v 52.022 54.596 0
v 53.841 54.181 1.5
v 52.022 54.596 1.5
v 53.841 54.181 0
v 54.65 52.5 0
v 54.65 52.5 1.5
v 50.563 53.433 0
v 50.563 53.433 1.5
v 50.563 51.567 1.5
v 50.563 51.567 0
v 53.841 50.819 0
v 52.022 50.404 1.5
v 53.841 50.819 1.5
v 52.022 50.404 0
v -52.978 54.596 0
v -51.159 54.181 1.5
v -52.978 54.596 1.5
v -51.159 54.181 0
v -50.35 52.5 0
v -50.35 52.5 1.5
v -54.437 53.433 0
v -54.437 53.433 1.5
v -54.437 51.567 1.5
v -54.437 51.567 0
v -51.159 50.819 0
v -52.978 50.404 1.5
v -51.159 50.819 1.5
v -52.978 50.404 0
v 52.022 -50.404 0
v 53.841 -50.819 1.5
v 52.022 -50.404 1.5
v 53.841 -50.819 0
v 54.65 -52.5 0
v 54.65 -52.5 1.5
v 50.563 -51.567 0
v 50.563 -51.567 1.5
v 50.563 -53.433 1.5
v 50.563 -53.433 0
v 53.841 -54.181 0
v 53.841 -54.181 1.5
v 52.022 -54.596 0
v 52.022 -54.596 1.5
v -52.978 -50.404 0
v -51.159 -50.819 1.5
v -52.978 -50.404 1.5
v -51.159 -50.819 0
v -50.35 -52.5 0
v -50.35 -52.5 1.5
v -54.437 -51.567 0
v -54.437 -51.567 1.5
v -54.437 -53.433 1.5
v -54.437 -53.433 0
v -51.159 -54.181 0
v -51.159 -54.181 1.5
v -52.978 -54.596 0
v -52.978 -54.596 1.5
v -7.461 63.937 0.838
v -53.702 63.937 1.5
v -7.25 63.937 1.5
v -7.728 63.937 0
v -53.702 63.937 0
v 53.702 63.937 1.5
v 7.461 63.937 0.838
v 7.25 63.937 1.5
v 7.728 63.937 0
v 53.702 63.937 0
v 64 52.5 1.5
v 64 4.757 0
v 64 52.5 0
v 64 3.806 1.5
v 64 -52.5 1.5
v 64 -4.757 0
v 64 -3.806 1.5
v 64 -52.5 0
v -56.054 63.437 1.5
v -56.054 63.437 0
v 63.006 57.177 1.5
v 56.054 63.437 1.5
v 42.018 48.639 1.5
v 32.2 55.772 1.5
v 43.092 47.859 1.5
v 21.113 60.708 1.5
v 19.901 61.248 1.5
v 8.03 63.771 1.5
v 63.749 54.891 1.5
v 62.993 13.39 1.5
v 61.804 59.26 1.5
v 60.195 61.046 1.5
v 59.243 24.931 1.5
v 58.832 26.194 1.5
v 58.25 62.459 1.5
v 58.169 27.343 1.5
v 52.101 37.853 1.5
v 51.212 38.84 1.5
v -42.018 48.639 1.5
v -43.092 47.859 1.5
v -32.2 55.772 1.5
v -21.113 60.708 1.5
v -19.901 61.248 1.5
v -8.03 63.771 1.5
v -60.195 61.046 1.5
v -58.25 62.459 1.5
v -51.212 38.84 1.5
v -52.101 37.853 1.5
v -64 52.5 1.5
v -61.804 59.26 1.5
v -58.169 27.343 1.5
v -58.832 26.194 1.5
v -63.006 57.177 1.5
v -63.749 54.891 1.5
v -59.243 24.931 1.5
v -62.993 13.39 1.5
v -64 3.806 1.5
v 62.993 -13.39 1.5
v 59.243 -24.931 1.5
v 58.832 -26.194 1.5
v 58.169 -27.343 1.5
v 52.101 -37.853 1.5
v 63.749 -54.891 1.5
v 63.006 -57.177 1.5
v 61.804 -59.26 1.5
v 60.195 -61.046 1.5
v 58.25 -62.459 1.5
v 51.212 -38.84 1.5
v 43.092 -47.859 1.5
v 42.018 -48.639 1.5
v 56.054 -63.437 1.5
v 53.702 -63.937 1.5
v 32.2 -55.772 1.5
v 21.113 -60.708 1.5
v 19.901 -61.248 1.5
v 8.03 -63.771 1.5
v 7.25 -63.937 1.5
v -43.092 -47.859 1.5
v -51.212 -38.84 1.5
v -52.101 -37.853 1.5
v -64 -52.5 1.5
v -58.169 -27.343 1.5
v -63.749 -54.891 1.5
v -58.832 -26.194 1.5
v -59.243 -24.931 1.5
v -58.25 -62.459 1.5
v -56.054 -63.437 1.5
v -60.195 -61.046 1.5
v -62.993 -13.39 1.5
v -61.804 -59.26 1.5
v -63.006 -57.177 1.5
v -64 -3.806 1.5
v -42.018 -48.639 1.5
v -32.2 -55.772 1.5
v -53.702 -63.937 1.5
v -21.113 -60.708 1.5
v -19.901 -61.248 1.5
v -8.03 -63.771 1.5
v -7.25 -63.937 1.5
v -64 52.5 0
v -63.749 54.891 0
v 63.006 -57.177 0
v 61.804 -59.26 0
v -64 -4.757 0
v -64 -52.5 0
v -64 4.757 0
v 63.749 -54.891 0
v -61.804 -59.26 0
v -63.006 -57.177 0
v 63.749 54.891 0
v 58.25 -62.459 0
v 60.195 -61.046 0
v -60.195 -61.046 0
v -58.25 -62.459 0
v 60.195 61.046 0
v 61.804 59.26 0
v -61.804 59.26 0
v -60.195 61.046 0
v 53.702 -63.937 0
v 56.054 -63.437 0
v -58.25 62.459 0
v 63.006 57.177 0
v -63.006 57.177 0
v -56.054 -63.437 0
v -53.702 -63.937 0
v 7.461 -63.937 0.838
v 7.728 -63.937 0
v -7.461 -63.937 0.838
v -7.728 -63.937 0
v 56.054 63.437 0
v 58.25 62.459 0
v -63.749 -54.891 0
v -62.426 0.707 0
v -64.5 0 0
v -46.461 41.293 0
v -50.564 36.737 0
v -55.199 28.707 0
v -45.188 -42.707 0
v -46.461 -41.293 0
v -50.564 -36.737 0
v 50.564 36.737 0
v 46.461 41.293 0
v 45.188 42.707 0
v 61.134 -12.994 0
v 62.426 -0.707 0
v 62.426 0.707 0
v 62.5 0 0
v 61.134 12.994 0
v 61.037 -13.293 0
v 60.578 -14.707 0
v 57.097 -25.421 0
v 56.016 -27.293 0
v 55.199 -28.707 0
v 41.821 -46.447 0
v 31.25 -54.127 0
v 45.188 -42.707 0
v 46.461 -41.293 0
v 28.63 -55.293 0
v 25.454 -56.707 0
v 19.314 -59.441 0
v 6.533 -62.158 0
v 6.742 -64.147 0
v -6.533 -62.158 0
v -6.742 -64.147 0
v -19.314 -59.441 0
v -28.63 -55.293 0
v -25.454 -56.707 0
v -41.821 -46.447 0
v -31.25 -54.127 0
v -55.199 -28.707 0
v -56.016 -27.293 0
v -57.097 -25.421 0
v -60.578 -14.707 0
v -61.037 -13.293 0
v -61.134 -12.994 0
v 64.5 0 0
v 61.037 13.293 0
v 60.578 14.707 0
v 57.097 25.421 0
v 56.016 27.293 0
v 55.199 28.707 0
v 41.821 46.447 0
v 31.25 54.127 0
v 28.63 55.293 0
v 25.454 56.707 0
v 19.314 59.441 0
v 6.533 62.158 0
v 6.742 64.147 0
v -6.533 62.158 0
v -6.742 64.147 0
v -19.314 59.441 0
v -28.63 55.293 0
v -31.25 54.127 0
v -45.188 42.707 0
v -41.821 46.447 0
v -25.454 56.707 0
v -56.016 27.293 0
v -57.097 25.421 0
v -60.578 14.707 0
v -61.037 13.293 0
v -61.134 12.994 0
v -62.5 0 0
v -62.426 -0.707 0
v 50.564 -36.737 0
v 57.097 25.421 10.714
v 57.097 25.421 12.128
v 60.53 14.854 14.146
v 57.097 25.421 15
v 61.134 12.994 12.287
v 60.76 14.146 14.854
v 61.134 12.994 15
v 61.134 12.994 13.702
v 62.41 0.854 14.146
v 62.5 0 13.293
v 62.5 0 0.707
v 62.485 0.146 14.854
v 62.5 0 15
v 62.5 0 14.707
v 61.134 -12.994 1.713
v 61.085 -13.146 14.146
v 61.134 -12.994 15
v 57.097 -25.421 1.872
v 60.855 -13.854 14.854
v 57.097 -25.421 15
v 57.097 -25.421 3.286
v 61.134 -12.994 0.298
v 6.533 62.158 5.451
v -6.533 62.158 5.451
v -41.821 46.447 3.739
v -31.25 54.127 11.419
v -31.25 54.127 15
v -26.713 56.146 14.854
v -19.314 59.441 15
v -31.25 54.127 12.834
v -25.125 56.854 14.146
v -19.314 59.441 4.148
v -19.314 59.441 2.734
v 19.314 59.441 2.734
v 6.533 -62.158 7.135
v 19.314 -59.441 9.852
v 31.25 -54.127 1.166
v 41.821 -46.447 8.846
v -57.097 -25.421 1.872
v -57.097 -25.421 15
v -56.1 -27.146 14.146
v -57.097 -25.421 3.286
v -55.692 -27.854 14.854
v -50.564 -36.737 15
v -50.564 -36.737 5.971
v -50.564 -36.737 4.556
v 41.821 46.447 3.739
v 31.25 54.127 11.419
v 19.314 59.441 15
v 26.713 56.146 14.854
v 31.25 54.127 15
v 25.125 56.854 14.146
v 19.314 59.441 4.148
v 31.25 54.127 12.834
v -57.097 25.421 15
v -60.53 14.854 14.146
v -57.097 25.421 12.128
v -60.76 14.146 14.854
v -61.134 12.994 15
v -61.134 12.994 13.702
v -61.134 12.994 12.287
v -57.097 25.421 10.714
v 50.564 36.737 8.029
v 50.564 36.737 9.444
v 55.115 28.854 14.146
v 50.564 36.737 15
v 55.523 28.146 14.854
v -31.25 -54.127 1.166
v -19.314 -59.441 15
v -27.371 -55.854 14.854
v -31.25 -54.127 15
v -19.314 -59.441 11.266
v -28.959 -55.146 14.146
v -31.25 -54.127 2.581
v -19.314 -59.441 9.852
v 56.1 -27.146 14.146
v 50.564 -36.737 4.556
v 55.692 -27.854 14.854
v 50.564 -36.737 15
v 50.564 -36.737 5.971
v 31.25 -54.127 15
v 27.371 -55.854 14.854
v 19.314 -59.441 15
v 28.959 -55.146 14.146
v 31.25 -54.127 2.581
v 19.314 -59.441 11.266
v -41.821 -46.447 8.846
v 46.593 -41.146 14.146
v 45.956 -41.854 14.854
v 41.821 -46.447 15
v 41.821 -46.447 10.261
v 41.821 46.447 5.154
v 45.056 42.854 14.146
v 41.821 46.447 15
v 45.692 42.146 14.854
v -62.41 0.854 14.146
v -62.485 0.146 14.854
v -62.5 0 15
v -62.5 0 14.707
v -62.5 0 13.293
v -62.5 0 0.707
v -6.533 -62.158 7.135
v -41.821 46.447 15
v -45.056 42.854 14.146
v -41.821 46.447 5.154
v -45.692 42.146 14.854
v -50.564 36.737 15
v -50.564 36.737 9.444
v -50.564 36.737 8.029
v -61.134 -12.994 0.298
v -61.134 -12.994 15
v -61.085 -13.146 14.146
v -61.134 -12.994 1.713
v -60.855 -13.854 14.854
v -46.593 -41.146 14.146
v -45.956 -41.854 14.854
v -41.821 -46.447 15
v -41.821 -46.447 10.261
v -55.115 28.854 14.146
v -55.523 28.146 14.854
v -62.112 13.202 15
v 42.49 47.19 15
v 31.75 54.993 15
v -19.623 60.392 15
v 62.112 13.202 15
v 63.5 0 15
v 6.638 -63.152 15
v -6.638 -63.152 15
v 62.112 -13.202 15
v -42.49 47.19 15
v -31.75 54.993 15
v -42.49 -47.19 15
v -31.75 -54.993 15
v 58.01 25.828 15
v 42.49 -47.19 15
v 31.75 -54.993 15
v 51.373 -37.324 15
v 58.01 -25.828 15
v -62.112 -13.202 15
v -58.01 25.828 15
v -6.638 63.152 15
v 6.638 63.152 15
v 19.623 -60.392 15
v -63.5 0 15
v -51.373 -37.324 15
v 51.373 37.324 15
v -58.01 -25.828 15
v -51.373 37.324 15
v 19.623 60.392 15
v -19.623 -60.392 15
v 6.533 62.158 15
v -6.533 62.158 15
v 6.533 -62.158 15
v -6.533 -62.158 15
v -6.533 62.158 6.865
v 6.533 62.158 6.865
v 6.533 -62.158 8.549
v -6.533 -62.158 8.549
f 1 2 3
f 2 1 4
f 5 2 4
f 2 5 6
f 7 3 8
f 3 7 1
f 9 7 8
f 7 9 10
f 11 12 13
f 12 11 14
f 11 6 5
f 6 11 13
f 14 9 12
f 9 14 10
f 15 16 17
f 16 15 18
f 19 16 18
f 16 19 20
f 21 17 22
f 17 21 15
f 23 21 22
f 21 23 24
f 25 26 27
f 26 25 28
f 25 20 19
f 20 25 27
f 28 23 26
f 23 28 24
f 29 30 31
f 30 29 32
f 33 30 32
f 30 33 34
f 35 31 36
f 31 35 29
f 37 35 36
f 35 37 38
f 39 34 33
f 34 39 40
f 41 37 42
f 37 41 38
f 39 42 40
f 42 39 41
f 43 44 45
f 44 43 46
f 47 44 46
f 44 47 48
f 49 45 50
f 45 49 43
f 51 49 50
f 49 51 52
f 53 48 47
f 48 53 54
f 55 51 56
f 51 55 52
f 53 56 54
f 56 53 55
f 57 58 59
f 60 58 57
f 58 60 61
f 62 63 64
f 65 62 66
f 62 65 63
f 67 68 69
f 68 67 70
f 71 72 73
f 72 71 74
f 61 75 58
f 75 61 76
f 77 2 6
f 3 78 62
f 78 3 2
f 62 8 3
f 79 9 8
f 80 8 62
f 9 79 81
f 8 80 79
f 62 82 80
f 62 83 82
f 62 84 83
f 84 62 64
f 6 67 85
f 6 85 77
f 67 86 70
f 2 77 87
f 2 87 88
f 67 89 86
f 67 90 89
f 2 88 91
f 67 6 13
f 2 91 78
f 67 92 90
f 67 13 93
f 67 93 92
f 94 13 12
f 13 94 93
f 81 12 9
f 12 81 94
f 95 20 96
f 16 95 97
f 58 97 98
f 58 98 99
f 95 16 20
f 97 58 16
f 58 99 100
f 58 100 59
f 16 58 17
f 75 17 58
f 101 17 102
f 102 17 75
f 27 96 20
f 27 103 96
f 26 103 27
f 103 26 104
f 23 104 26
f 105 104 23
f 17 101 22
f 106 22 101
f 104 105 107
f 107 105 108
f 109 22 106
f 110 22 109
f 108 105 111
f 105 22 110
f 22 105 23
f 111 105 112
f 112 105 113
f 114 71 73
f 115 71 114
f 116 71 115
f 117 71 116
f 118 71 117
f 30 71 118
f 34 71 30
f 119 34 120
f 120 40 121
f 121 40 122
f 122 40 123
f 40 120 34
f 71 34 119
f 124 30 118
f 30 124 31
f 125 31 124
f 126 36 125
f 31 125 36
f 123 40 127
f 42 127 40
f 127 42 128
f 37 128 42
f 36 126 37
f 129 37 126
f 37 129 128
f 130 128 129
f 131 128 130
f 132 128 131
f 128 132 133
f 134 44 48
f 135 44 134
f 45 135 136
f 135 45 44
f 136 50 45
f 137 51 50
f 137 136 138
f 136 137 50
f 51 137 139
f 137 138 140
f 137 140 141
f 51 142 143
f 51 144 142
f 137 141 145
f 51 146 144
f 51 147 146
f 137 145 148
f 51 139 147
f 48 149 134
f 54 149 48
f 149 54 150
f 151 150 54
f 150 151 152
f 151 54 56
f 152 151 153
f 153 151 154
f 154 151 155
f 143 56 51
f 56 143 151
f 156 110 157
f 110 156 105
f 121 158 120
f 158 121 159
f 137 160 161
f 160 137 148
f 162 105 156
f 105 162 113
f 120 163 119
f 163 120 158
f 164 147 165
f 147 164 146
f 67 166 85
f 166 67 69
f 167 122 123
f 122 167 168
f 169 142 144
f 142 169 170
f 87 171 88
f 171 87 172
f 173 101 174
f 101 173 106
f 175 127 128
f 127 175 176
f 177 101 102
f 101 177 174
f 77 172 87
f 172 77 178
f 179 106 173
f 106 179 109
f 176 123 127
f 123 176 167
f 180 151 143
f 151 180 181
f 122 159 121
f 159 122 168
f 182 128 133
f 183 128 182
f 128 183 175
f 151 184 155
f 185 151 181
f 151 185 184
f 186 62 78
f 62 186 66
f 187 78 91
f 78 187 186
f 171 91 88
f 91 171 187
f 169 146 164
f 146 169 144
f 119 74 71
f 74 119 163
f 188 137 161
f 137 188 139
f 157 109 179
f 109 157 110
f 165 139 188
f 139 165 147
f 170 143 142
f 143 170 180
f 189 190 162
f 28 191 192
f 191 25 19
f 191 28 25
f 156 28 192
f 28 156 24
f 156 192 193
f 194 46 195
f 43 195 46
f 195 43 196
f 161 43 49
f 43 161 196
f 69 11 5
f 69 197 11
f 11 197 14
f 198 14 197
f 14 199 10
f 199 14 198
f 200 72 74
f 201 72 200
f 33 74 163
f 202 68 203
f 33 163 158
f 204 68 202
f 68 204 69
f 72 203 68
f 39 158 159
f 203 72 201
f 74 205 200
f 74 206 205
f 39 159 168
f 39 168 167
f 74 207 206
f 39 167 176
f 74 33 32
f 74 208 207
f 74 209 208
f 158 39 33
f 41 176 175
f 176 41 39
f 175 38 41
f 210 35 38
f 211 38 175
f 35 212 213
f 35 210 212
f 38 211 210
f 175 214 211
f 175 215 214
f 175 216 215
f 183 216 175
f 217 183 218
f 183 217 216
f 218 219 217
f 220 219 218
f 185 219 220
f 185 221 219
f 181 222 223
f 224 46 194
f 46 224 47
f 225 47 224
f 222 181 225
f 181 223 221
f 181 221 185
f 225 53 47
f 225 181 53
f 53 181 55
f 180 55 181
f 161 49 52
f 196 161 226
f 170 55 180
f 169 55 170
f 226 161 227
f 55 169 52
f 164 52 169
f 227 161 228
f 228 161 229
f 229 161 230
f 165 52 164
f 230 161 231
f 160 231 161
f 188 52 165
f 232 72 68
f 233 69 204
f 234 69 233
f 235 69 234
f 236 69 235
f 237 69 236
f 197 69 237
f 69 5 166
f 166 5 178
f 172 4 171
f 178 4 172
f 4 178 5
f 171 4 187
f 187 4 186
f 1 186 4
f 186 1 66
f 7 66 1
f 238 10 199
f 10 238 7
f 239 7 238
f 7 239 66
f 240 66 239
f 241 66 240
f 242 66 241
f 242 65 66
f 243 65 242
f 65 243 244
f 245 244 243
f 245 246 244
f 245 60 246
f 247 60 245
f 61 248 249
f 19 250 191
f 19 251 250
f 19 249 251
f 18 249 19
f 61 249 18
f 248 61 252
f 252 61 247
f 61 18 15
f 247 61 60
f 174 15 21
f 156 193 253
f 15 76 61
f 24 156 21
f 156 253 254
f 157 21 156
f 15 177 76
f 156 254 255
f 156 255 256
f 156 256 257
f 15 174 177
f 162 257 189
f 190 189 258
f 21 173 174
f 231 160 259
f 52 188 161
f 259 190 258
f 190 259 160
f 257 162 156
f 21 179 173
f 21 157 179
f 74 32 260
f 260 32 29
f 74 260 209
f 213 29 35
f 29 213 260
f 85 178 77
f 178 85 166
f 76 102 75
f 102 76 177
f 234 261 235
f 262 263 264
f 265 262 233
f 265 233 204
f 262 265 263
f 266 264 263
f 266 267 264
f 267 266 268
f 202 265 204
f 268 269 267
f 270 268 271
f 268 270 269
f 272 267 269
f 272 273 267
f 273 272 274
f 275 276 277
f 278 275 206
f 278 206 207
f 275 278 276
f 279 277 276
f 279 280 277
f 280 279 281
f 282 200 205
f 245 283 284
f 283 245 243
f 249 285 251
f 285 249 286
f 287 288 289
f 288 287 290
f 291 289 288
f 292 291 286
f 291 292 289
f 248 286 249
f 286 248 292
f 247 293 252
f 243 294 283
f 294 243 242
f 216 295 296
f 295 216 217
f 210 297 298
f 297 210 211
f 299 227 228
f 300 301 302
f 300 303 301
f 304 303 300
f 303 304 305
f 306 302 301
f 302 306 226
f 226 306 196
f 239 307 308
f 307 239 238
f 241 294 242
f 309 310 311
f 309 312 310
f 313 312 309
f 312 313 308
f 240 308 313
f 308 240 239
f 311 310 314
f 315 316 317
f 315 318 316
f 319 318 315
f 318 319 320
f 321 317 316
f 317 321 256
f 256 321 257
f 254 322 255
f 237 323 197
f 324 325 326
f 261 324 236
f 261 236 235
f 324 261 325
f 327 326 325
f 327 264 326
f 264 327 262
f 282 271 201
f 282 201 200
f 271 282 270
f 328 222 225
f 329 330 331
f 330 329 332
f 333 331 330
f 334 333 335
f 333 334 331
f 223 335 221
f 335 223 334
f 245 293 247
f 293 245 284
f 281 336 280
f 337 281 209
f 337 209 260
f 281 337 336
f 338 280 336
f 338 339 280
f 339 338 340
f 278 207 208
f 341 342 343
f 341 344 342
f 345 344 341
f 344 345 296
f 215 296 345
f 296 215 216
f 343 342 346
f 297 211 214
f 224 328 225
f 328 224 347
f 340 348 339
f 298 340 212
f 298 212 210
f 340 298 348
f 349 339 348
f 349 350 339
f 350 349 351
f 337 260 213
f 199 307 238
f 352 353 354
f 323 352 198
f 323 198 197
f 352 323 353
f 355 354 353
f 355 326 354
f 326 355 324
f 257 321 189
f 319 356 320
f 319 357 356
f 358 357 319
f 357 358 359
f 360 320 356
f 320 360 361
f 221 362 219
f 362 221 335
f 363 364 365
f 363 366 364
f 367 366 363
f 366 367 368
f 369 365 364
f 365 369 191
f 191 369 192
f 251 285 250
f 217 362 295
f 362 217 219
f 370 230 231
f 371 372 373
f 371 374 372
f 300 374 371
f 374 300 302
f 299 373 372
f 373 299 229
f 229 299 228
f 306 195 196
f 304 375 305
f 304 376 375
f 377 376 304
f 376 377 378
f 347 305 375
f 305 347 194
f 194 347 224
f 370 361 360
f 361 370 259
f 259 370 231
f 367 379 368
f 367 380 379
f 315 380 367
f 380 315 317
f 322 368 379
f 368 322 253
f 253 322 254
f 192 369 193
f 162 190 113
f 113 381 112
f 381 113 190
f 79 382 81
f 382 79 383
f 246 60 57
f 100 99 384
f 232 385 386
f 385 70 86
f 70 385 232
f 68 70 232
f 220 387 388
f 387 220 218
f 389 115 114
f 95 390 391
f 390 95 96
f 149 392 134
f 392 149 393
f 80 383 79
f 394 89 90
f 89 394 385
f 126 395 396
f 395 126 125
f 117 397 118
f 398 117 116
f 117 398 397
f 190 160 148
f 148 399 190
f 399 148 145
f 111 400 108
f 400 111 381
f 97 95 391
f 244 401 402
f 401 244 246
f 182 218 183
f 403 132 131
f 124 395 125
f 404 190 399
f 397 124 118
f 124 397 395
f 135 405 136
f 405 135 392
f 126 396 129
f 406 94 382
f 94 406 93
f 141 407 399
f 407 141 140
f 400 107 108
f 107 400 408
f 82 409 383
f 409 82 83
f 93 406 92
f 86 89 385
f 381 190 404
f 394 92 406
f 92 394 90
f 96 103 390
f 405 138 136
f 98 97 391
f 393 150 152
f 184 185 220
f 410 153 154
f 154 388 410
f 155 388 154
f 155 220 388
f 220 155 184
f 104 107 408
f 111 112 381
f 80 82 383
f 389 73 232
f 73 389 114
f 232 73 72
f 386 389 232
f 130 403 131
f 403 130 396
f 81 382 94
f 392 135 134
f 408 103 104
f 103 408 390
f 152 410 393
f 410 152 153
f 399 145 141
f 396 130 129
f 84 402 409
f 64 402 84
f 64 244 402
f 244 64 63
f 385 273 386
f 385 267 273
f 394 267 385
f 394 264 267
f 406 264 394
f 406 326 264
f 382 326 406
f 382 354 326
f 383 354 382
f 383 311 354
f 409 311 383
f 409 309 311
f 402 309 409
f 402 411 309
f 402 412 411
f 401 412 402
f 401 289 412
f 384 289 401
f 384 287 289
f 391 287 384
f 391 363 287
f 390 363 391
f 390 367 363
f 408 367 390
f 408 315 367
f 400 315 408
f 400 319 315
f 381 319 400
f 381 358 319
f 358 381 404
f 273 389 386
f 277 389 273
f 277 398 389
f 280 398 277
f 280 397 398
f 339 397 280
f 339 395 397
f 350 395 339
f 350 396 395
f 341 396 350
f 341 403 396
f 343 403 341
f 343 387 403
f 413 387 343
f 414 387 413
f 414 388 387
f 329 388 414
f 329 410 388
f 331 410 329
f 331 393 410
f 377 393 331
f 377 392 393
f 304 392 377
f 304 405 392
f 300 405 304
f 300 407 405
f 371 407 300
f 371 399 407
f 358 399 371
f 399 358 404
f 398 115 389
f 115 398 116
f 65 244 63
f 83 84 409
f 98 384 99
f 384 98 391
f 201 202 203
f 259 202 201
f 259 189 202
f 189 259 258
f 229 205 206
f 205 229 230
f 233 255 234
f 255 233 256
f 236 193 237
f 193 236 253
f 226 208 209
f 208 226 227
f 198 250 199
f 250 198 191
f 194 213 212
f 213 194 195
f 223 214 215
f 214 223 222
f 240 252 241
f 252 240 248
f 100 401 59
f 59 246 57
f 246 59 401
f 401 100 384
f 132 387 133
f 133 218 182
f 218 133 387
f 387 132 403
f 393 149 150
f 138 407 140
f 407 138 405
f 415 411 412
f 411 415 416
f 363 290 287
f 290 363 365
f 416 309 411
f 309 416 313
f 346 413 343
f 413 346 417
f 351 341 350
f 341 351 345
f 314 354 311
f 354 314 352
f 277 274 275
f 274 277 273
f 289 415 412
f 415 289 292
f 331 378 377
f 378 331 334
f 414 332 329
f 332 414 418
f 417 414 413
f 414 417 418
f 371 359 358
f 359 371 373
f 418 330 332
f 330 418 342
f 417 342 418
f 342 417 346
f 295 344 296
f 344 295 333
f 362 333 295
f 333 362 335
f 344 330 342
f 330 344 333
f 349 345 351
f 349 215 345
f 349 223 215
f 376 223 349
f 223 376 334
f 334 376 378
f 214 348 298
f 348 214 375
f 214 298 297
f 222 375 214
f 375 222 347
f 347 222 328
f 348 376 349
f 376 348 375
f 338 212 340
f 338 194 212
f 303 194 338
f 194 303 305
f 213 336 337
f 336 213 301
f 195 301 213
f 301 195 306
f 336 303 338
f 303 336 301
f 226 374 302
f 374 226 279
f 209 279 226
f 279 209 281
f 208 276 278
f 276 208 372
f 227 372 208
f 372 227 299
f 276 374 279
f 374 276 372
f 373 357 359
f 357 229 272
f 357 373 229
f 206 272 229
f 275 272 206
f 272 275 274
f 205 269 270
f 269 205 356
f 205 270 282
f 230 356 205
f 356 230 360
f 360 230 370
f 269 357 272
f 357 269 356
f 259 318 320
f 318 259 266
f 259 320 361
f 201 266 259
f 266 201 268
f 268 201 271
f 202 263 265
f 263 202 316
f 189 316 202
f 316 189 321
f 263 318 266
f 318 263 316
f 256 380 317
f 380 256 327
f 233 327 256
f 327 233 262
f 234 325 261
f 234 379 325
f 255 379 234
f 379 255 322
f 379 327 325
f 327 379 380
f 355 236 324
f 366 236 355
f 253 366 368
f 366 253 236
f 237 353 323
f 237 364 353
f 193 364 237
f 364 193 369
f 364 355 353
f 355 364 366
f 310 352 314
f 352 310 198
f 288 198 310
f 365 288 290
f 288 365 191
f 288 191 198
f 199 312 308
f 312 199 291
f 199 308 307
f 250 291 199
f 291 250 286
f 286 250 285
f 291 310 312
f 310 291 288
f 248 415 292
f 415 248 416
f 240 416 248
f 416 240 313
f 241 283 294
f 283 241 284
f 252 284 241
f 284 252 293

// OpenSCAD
// file: lib-constants.scad
fan_mounting_hole_spacing = 105;
fan_mounting_hole_diameter = 4.3;  // slightly oversized for #8, will probably need drilling anyway
fan_frame_width = 120;

minimum_roundover = (fan_frame_width - fan_mounting_hole_spacing) / 2;

module mounting_plate(roundover_and_margin, plate_thick, hole_dia) {
  difference() {
        minkowski() {
            // each of these has half height so the sum is full height
            cylinder(r=roundover_and_margin, h=plate_thick / 2, center=true);
            cube([fan_mounting_hole_spacing, fan_mounting_hole_spacing, plate_thick / 2], center=true);
        }
        
        cylinder(d=hole_dia, h=plate_thick * 2, center=true);
        
        frame_hole_negative();
    }
}

module frame_hole_negative(h=1000) {
    frame_hole_pattern() cylinder(d=fan_mounting_hole_diameter, h=h, center=true);
}

module frame_hole_pattern() {
    r = fan_mounting_hole_spacing / 2;
    translate([ r,  r, 0]) children();
    translate([-r,  r, 0]) children();
    translate([ r, -r, 0]) children();
    translate([-r, -r, 0]) children();
}
// main file
include <lib-constants.scad>;

// must be at least 7.5 mm to allow for the difference between hole pattern and frame size, but we also want to fit over a bad/misaligned hole
roundover_and_margin = 7.5 + 4;
plate_thick = 1.5;

screen_frame_thick = 1;
screen_slat_thick = 1;
screen_across = fan_frame_width + 5;
screen_depth = 15;
screen_slat_spacing = 14;
screen_slat_phase = 0;

epsilon = 0.1;

translate([0, 0, plate_thick / 2])
mounting_plate(roundover_and_margin=roundover_and_margin, plate_thick=plate_thick, hole_dia=screen_across);

// frame of louver
translate(plate_thick - epsilon)
screen();

module screen() {
    translate([0, 0, screen_depth / 2])
    difference() {
      cylinder(
        d1=screen_across + screen_frame_thick * 4,
        d2=screen_across + screen_frame_thick * 2,
        h=screen_depth,
        center=true);
      cylinder(d=screen_across, h=screen_depth + epsilon, center=true);
    }

    difference() {
        intersection() {
            for (i = [-5:4]) {
                diag = isosceles_hypotenuse(screen_depth * 2) - isosceles_hypotenuse(screen_slat_thick);

                translate([0, screen_slat_phase + screen_slat_spacing * i, 0])
                rotate([45, 0, 0])
                cube([screen_across, diag, screen_slat_thick], center=true);
            }
            cylinder(d=screen_across + epsilon, h=1000, center=true);
        }
        
        // cut slats off at base for support
        halfneg = -(screen_across + epsilon) / 2;
        translate([halfneg, halfneg, -screen_depth])
        cube([screen_across + epsilon, screen_across + epsilon, screen_depth]);
    }
}

function isosceles_hypotenuse(d) = sqrt(pow(d, 2) * 2);
